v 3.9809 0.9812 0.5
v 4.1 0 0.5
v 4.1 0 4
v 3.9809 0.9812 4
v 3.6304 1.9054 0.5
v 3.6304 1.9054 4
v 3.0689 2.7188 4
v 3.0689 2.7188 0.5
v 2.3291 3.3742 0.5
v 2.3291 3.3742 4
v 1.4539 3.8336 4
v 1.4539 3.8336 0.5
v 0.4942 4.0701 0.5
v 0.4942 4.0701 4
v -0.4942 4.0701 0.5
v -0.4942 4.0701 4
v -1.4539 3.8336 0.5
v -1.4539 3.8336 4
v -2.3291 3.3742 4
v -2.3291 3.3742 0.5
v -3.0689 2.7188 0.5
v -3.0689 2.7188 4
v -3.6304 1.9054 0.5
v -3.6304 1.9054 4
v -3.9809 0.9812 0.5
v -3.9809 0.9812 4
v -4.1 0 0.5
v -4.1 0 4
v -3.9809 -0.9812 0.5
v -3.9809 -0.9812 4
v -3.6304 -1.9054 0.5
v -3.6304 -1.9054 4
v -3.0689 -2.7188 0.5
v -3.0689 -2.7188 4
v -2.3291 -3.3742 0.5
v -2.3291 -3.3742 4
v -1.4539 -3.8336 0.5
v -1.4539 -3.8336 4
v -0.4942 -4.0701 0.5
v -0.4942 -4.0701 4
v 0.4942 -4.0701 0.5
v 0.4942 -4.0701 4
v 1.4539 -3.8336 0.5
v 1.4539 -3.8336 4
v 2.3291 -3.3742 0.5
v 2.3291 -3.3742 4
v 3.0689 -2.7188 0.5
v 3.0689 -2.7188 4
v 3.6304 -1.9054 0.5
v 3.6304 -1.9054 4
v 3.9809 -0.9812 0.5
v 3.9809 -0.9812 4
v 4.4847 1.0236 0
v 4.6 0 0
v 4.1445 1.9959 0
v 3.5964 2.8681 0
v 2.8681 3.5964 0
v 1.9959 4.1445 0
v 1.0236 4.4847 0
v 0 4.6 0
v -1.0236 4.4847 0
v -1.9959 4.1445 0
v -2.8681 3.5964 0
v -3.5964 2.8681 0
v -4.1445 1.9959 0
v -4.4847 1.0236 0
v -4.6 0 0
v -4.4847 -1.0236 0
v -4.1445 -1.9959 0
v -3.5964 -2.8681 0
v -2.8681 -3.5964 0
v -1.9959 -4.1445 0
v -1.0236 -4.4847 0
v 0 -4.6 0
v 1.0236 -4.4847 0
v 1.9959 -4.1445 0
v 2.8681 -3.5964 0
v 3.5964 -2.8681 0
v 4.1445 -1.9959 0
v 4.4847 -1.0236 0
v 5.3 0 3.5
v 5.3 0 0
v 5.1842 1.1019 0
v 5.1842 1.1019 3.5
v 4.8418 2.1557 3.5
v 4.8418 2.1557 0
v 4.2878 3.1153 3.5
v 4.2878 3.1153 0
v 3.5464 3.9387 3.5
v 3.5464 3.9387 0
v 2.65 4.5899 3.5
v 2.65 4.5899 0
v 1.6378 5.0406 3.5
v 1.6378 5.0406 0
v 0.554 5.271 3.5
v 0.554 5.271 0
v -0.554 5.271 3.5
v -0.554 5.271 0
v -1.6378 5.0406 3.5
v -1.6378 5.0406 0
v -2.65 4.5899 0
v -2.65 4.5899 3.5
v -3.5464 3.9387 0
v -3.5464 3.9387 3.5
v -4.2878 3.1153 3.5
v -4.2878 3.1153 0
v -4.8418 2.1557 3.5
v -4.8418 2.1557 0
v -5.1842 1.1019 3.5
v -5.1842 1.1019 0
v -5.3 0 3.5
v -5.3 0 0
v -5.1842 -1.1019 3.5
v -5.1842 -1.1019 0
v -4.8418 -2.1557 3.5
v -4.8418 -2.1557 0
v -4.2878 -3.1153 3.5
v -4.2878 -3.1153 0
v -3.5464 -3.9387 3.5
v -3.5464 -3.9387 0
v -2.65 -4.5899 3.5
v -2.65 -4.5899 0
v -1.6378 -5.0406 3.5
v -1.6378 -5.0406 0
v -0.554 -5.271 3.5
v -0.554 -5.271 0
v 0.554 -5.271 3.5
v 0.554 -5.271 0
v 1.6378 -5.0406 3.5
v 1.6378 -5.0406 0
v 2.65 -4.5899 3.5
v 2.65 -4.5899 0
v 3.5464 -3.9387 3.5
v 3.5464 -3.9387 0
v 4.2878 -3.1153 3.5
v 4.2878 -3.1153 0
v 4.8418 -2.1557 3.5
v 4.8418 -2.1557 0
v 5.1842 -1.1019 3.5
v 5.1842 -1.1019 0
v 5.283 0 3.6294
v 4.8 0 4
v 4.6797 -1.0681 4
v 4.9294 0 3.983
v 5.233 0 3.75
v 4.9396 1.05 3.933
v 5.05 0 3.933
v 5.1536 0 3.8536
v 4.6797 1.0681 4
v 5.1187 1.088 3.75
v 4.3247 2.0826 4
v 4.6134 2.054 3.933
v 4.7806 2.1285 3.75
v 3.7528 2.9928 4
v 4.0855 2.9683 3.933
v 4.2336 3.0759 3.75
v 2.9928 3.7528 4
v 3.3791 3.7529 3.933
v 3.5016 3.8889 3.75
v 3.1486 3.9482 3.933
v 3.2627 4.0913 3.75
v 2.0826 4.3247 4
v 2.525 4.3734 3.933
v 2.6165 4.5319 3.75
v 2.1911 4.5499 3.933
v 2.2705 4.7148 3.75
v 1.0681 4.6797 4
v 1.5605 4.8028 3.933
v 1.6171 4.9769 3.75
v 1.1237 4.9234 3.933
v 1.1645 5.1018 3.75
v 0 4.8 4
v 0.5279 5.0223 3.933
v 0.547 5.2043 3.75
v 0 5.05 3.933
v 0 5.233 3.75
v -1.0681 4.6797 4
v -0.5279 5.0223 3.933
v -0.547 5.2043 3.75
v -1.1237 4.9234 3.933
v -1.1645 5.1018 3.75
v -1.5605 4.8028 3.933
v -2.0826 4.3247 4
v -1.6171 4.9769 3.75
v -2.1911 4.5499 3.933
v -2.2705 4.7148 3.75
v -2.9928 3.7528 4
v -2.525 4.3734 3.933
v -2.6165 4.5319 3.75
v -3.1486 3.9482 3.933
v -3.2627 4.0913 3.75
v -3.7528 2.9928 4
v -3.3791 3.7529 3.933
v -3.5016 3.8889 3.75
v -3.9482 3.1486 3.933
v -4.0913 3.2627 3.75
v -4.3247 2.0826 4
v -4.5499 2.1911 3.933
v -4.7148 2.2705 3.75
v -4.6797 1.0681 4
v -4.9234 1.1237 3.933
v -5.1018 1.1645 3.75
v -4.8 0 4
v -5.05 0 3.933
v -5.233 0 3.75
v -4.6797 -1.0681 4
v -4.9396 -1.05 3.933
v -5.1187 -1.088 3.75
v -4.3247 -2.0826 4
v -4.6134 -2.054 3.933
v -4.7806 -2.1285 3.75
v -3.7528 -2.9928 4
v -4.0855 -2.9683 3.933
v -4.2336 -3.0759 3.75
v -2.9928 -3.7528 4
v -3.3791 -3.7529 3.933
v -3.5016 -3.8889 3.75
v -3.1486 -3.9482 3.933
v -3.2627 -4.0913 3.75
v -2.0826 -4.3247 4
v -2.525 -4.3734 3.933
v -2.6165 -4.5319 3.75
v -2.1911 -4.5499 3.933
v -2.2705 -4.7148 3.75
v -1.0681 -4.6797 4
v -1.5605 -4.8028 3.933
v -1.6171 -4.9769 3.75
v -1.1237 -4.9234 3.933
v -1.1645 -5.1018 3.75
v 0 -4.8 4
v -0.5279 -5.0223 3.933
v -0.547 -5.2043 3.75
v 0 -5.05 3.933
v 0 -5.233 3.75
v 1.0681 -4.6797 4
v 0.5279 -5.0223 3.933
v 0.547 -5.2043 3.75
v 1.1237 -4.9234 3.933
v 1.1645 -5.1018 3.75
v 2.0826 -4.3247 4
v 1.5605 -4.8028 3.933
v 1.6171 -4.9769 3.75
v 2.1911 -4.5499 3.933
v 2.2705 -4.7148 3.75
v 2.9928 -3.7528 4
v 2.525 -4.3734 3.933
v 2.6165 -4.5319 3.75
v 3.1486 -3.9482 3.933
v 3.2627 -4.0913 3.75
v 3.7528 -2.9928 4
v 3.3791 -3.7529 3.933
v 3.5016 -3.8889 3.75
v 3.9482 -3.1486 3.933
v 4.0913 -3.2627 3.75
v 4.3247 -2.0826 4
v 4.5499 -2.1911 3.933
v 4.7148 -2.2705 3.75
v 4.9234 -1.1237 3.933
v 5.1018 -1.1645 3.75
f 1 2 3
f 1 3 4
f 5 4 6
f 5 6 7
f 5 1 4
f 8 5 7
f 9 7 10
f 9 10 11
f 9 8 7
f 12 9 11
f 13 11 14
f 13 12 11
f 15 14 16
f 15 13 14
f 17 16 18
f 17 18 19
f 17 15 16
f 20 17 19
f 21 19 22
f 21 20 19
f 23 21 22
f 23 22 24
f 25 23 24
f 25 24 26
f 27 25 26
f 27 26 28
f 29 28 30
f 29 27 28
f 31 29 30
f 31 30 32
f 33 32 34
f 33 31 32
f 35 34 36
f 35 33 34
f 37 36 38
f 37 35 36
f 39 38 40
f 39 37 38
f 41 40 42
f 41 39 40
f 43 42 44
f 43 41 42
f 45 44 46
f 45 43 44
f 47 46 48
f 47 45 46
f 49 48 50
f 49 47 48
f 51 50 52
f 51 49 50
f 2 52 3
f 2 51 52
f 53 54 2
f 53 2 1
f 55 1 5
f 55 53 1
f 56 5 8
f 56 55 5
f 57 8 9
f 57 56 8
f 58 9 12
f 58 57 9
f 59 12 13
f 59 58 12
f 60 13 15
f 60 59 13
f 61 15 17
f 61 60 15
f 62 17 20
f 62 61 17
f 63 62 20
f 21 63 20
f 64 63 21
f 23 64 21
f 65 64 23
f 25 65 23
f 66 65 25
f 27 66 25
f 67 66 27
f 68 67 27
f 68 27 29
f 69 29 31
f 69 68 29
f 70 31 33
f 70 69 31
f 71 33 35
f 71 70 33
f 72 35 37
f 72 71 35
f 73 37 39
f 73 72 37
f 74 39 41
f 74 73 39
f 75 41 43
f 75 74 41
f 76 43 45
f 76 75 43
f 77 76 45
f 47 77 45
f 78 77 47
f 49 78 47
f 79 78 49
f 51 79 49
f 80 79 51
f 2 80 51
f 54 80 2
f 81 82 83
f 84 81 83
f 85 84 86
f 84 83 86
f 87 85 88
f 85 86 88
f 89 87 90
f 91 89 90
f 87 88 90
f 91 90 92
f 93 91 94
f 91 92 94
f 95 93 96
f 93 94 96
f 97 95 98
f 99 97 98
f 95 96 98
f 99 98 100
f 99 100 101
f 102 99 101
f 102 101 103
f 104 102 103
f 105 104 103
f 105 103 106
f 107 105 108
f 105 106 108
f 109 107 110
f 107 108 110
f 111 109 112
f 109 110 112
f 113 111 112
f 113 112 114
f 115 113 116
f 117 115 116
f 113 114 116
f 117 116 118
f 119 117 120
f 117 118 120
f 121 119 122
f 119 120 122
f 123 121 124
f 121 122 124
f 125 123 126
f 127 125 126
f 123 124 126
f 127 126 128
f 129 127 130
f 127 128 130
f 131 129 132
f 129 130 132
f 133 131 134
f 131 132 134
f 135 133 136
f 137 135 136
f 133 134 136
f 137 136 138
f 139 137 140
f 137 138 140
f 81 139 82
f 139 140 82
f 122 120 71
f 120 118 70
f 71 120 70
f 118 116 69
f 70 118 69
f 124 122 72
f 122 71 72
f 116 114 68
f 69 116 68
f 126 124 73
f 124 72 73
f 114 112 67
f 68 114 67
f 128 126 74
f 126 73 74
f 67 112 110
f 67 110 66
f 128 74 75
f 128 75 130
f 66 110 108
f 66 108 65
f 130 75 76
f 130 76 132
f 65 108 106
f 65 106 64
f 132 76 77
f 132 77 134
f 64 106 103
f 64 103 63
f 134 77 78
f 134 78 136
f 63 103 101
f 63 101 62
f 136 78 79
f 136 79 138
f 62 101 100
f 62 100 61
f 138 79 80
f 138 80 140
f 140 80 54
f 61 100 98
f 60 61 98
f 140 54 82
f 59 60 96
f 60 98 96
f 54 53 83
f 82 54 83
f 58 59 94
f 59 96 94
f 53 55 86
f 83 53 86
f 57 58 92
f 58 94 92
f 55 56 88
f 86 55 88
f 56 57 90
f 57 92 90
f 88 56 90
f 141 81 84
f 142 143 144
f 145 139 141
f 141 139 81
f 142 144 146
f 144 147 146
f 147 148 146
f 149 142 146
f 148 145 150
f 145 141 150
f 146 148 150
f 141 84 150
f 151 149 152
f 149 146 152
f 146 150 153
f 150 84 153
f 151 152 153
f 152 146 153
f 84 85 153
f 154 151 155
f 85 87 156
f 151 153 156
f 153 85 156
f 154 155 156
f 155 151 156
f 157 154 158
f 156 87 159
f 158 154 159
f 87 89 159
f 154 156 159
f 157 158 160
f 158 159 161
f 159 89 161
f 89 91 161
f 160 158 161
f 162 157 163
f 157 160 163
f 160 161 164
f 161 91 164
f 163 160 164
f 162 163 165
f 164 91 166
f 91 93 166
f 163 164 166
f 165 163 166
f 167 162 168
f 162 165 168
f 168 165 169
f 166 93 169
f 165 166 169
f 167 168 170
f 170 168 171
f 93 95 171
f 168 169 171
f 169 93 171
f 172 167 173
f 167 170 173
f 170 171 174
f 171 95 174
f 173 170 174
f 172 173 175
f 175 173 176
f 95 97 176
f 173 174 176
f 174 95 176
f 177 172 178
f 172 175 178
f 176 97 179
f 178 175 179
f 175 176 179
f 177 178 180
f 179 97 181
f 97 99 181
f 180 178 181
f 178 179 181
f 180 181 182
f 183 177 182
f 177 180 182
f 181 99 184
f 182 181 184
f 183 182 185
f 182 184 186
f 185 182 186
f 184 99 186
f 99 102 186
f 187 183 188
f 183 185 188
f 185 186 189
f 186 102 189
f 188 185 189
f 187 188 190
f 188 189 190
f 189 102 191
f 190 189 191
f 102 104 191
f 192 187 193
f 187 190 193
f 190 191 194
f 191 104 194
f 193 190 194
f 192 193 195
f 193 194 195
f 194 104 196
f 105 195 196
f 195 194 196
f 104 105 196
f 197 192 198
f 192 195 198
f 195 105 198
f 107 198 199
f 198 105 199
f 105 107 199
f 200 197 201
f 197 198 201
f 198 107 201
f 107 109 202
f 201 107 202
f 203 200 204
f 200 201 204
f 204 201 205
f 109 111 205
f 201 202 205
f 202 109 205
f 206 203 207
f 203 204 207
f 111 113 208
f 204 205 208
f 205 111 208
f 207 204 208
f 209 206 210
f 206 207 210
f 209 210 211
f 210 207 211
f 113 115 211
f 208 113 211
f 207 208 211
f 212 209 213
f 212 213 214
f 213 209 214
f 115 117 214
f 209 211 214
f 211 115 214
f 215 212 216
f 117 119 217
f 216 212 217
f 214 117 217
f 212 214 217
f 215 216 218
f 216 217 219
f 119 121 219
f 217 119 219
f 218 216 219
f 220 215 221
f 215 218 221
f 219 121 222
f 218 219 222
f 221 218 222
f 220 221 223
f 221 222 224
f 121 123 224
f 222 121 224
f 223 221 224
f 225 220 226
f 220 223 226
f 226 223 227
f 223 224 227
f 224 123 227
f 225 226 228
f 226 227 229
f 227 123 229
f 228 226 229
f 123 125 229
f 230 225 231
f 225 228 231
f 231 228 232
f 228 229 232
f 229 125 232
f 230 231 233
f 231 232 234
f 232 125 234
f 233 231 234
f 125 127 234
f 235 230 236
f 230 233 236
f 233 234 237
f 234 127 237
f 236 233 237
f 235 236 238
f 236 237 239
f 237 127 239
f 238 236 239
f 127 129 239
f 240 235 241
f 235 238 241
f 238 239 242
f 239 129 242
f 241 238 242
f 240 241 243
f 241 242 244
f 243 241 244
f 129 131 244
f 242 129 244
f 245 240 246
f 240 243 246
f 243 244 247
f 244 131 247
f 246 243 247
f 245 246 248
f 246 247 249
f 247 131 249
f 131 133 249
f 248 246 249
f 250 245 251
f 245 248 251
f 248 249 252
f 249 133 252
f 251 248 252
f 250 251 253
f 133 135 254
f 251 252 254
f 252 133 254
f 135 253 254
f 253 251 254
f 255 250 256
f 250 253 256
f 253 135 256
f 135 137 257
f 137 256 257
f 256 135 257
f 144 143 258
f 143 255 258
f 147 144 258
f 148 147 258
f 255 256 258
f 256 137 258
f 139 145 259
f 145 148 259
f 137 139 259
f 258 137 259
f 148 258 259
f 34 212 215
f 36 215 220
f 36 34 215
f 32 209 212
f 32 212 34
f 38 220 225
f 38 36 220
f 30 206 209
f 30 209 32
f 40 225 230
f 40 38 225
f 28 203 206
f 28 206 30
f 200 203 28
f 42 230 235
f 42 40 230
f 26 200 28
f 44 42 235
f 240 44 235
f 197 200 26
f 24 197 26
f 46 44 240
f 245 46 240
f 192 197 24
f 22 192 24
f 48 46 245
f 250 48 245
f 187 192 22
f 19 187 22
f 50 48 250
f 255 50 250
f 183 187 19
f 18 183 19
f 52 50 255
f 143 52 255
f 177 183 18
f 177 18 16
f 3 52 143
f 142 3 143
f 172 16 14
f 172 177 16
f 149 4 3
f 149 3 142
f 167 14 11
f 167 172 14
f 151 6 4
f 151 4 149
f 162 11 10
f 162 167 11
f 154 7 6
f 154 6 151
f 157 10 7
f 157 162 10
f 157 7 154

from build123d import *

# Parameters (mm, degrees)
F0_R     = 5.3
F0_R_2   = 4.1
F1_DEPTH = 4
F2_SIZE  = 0.5
F3_R     = 0.5


with BuildPart() as f1:
    # F0 (on Top) → F1 (new body)
    with BuildSketch(Plane.XY):
        Circle(F0_R)
        Circle(F0_R_2, mode=Mode.SUBTRACT)
    extrude(amount=F1_DEPTH)

    # F2
    f2_edges = [f1.edges().sort_by_distance(p)[0] for p in [
        (-4.1, 0, 0),
    ]]
    chamfer(f2_edges, length=F2_SIZE)

    # F3
    f3_edges = [f1.edges().sort_by_distance(p)[0] for p in [
        (-5.3, 0, 4),
    ]]
    fillet(f3_edges, radius=F3_R)


solid = f1.part
